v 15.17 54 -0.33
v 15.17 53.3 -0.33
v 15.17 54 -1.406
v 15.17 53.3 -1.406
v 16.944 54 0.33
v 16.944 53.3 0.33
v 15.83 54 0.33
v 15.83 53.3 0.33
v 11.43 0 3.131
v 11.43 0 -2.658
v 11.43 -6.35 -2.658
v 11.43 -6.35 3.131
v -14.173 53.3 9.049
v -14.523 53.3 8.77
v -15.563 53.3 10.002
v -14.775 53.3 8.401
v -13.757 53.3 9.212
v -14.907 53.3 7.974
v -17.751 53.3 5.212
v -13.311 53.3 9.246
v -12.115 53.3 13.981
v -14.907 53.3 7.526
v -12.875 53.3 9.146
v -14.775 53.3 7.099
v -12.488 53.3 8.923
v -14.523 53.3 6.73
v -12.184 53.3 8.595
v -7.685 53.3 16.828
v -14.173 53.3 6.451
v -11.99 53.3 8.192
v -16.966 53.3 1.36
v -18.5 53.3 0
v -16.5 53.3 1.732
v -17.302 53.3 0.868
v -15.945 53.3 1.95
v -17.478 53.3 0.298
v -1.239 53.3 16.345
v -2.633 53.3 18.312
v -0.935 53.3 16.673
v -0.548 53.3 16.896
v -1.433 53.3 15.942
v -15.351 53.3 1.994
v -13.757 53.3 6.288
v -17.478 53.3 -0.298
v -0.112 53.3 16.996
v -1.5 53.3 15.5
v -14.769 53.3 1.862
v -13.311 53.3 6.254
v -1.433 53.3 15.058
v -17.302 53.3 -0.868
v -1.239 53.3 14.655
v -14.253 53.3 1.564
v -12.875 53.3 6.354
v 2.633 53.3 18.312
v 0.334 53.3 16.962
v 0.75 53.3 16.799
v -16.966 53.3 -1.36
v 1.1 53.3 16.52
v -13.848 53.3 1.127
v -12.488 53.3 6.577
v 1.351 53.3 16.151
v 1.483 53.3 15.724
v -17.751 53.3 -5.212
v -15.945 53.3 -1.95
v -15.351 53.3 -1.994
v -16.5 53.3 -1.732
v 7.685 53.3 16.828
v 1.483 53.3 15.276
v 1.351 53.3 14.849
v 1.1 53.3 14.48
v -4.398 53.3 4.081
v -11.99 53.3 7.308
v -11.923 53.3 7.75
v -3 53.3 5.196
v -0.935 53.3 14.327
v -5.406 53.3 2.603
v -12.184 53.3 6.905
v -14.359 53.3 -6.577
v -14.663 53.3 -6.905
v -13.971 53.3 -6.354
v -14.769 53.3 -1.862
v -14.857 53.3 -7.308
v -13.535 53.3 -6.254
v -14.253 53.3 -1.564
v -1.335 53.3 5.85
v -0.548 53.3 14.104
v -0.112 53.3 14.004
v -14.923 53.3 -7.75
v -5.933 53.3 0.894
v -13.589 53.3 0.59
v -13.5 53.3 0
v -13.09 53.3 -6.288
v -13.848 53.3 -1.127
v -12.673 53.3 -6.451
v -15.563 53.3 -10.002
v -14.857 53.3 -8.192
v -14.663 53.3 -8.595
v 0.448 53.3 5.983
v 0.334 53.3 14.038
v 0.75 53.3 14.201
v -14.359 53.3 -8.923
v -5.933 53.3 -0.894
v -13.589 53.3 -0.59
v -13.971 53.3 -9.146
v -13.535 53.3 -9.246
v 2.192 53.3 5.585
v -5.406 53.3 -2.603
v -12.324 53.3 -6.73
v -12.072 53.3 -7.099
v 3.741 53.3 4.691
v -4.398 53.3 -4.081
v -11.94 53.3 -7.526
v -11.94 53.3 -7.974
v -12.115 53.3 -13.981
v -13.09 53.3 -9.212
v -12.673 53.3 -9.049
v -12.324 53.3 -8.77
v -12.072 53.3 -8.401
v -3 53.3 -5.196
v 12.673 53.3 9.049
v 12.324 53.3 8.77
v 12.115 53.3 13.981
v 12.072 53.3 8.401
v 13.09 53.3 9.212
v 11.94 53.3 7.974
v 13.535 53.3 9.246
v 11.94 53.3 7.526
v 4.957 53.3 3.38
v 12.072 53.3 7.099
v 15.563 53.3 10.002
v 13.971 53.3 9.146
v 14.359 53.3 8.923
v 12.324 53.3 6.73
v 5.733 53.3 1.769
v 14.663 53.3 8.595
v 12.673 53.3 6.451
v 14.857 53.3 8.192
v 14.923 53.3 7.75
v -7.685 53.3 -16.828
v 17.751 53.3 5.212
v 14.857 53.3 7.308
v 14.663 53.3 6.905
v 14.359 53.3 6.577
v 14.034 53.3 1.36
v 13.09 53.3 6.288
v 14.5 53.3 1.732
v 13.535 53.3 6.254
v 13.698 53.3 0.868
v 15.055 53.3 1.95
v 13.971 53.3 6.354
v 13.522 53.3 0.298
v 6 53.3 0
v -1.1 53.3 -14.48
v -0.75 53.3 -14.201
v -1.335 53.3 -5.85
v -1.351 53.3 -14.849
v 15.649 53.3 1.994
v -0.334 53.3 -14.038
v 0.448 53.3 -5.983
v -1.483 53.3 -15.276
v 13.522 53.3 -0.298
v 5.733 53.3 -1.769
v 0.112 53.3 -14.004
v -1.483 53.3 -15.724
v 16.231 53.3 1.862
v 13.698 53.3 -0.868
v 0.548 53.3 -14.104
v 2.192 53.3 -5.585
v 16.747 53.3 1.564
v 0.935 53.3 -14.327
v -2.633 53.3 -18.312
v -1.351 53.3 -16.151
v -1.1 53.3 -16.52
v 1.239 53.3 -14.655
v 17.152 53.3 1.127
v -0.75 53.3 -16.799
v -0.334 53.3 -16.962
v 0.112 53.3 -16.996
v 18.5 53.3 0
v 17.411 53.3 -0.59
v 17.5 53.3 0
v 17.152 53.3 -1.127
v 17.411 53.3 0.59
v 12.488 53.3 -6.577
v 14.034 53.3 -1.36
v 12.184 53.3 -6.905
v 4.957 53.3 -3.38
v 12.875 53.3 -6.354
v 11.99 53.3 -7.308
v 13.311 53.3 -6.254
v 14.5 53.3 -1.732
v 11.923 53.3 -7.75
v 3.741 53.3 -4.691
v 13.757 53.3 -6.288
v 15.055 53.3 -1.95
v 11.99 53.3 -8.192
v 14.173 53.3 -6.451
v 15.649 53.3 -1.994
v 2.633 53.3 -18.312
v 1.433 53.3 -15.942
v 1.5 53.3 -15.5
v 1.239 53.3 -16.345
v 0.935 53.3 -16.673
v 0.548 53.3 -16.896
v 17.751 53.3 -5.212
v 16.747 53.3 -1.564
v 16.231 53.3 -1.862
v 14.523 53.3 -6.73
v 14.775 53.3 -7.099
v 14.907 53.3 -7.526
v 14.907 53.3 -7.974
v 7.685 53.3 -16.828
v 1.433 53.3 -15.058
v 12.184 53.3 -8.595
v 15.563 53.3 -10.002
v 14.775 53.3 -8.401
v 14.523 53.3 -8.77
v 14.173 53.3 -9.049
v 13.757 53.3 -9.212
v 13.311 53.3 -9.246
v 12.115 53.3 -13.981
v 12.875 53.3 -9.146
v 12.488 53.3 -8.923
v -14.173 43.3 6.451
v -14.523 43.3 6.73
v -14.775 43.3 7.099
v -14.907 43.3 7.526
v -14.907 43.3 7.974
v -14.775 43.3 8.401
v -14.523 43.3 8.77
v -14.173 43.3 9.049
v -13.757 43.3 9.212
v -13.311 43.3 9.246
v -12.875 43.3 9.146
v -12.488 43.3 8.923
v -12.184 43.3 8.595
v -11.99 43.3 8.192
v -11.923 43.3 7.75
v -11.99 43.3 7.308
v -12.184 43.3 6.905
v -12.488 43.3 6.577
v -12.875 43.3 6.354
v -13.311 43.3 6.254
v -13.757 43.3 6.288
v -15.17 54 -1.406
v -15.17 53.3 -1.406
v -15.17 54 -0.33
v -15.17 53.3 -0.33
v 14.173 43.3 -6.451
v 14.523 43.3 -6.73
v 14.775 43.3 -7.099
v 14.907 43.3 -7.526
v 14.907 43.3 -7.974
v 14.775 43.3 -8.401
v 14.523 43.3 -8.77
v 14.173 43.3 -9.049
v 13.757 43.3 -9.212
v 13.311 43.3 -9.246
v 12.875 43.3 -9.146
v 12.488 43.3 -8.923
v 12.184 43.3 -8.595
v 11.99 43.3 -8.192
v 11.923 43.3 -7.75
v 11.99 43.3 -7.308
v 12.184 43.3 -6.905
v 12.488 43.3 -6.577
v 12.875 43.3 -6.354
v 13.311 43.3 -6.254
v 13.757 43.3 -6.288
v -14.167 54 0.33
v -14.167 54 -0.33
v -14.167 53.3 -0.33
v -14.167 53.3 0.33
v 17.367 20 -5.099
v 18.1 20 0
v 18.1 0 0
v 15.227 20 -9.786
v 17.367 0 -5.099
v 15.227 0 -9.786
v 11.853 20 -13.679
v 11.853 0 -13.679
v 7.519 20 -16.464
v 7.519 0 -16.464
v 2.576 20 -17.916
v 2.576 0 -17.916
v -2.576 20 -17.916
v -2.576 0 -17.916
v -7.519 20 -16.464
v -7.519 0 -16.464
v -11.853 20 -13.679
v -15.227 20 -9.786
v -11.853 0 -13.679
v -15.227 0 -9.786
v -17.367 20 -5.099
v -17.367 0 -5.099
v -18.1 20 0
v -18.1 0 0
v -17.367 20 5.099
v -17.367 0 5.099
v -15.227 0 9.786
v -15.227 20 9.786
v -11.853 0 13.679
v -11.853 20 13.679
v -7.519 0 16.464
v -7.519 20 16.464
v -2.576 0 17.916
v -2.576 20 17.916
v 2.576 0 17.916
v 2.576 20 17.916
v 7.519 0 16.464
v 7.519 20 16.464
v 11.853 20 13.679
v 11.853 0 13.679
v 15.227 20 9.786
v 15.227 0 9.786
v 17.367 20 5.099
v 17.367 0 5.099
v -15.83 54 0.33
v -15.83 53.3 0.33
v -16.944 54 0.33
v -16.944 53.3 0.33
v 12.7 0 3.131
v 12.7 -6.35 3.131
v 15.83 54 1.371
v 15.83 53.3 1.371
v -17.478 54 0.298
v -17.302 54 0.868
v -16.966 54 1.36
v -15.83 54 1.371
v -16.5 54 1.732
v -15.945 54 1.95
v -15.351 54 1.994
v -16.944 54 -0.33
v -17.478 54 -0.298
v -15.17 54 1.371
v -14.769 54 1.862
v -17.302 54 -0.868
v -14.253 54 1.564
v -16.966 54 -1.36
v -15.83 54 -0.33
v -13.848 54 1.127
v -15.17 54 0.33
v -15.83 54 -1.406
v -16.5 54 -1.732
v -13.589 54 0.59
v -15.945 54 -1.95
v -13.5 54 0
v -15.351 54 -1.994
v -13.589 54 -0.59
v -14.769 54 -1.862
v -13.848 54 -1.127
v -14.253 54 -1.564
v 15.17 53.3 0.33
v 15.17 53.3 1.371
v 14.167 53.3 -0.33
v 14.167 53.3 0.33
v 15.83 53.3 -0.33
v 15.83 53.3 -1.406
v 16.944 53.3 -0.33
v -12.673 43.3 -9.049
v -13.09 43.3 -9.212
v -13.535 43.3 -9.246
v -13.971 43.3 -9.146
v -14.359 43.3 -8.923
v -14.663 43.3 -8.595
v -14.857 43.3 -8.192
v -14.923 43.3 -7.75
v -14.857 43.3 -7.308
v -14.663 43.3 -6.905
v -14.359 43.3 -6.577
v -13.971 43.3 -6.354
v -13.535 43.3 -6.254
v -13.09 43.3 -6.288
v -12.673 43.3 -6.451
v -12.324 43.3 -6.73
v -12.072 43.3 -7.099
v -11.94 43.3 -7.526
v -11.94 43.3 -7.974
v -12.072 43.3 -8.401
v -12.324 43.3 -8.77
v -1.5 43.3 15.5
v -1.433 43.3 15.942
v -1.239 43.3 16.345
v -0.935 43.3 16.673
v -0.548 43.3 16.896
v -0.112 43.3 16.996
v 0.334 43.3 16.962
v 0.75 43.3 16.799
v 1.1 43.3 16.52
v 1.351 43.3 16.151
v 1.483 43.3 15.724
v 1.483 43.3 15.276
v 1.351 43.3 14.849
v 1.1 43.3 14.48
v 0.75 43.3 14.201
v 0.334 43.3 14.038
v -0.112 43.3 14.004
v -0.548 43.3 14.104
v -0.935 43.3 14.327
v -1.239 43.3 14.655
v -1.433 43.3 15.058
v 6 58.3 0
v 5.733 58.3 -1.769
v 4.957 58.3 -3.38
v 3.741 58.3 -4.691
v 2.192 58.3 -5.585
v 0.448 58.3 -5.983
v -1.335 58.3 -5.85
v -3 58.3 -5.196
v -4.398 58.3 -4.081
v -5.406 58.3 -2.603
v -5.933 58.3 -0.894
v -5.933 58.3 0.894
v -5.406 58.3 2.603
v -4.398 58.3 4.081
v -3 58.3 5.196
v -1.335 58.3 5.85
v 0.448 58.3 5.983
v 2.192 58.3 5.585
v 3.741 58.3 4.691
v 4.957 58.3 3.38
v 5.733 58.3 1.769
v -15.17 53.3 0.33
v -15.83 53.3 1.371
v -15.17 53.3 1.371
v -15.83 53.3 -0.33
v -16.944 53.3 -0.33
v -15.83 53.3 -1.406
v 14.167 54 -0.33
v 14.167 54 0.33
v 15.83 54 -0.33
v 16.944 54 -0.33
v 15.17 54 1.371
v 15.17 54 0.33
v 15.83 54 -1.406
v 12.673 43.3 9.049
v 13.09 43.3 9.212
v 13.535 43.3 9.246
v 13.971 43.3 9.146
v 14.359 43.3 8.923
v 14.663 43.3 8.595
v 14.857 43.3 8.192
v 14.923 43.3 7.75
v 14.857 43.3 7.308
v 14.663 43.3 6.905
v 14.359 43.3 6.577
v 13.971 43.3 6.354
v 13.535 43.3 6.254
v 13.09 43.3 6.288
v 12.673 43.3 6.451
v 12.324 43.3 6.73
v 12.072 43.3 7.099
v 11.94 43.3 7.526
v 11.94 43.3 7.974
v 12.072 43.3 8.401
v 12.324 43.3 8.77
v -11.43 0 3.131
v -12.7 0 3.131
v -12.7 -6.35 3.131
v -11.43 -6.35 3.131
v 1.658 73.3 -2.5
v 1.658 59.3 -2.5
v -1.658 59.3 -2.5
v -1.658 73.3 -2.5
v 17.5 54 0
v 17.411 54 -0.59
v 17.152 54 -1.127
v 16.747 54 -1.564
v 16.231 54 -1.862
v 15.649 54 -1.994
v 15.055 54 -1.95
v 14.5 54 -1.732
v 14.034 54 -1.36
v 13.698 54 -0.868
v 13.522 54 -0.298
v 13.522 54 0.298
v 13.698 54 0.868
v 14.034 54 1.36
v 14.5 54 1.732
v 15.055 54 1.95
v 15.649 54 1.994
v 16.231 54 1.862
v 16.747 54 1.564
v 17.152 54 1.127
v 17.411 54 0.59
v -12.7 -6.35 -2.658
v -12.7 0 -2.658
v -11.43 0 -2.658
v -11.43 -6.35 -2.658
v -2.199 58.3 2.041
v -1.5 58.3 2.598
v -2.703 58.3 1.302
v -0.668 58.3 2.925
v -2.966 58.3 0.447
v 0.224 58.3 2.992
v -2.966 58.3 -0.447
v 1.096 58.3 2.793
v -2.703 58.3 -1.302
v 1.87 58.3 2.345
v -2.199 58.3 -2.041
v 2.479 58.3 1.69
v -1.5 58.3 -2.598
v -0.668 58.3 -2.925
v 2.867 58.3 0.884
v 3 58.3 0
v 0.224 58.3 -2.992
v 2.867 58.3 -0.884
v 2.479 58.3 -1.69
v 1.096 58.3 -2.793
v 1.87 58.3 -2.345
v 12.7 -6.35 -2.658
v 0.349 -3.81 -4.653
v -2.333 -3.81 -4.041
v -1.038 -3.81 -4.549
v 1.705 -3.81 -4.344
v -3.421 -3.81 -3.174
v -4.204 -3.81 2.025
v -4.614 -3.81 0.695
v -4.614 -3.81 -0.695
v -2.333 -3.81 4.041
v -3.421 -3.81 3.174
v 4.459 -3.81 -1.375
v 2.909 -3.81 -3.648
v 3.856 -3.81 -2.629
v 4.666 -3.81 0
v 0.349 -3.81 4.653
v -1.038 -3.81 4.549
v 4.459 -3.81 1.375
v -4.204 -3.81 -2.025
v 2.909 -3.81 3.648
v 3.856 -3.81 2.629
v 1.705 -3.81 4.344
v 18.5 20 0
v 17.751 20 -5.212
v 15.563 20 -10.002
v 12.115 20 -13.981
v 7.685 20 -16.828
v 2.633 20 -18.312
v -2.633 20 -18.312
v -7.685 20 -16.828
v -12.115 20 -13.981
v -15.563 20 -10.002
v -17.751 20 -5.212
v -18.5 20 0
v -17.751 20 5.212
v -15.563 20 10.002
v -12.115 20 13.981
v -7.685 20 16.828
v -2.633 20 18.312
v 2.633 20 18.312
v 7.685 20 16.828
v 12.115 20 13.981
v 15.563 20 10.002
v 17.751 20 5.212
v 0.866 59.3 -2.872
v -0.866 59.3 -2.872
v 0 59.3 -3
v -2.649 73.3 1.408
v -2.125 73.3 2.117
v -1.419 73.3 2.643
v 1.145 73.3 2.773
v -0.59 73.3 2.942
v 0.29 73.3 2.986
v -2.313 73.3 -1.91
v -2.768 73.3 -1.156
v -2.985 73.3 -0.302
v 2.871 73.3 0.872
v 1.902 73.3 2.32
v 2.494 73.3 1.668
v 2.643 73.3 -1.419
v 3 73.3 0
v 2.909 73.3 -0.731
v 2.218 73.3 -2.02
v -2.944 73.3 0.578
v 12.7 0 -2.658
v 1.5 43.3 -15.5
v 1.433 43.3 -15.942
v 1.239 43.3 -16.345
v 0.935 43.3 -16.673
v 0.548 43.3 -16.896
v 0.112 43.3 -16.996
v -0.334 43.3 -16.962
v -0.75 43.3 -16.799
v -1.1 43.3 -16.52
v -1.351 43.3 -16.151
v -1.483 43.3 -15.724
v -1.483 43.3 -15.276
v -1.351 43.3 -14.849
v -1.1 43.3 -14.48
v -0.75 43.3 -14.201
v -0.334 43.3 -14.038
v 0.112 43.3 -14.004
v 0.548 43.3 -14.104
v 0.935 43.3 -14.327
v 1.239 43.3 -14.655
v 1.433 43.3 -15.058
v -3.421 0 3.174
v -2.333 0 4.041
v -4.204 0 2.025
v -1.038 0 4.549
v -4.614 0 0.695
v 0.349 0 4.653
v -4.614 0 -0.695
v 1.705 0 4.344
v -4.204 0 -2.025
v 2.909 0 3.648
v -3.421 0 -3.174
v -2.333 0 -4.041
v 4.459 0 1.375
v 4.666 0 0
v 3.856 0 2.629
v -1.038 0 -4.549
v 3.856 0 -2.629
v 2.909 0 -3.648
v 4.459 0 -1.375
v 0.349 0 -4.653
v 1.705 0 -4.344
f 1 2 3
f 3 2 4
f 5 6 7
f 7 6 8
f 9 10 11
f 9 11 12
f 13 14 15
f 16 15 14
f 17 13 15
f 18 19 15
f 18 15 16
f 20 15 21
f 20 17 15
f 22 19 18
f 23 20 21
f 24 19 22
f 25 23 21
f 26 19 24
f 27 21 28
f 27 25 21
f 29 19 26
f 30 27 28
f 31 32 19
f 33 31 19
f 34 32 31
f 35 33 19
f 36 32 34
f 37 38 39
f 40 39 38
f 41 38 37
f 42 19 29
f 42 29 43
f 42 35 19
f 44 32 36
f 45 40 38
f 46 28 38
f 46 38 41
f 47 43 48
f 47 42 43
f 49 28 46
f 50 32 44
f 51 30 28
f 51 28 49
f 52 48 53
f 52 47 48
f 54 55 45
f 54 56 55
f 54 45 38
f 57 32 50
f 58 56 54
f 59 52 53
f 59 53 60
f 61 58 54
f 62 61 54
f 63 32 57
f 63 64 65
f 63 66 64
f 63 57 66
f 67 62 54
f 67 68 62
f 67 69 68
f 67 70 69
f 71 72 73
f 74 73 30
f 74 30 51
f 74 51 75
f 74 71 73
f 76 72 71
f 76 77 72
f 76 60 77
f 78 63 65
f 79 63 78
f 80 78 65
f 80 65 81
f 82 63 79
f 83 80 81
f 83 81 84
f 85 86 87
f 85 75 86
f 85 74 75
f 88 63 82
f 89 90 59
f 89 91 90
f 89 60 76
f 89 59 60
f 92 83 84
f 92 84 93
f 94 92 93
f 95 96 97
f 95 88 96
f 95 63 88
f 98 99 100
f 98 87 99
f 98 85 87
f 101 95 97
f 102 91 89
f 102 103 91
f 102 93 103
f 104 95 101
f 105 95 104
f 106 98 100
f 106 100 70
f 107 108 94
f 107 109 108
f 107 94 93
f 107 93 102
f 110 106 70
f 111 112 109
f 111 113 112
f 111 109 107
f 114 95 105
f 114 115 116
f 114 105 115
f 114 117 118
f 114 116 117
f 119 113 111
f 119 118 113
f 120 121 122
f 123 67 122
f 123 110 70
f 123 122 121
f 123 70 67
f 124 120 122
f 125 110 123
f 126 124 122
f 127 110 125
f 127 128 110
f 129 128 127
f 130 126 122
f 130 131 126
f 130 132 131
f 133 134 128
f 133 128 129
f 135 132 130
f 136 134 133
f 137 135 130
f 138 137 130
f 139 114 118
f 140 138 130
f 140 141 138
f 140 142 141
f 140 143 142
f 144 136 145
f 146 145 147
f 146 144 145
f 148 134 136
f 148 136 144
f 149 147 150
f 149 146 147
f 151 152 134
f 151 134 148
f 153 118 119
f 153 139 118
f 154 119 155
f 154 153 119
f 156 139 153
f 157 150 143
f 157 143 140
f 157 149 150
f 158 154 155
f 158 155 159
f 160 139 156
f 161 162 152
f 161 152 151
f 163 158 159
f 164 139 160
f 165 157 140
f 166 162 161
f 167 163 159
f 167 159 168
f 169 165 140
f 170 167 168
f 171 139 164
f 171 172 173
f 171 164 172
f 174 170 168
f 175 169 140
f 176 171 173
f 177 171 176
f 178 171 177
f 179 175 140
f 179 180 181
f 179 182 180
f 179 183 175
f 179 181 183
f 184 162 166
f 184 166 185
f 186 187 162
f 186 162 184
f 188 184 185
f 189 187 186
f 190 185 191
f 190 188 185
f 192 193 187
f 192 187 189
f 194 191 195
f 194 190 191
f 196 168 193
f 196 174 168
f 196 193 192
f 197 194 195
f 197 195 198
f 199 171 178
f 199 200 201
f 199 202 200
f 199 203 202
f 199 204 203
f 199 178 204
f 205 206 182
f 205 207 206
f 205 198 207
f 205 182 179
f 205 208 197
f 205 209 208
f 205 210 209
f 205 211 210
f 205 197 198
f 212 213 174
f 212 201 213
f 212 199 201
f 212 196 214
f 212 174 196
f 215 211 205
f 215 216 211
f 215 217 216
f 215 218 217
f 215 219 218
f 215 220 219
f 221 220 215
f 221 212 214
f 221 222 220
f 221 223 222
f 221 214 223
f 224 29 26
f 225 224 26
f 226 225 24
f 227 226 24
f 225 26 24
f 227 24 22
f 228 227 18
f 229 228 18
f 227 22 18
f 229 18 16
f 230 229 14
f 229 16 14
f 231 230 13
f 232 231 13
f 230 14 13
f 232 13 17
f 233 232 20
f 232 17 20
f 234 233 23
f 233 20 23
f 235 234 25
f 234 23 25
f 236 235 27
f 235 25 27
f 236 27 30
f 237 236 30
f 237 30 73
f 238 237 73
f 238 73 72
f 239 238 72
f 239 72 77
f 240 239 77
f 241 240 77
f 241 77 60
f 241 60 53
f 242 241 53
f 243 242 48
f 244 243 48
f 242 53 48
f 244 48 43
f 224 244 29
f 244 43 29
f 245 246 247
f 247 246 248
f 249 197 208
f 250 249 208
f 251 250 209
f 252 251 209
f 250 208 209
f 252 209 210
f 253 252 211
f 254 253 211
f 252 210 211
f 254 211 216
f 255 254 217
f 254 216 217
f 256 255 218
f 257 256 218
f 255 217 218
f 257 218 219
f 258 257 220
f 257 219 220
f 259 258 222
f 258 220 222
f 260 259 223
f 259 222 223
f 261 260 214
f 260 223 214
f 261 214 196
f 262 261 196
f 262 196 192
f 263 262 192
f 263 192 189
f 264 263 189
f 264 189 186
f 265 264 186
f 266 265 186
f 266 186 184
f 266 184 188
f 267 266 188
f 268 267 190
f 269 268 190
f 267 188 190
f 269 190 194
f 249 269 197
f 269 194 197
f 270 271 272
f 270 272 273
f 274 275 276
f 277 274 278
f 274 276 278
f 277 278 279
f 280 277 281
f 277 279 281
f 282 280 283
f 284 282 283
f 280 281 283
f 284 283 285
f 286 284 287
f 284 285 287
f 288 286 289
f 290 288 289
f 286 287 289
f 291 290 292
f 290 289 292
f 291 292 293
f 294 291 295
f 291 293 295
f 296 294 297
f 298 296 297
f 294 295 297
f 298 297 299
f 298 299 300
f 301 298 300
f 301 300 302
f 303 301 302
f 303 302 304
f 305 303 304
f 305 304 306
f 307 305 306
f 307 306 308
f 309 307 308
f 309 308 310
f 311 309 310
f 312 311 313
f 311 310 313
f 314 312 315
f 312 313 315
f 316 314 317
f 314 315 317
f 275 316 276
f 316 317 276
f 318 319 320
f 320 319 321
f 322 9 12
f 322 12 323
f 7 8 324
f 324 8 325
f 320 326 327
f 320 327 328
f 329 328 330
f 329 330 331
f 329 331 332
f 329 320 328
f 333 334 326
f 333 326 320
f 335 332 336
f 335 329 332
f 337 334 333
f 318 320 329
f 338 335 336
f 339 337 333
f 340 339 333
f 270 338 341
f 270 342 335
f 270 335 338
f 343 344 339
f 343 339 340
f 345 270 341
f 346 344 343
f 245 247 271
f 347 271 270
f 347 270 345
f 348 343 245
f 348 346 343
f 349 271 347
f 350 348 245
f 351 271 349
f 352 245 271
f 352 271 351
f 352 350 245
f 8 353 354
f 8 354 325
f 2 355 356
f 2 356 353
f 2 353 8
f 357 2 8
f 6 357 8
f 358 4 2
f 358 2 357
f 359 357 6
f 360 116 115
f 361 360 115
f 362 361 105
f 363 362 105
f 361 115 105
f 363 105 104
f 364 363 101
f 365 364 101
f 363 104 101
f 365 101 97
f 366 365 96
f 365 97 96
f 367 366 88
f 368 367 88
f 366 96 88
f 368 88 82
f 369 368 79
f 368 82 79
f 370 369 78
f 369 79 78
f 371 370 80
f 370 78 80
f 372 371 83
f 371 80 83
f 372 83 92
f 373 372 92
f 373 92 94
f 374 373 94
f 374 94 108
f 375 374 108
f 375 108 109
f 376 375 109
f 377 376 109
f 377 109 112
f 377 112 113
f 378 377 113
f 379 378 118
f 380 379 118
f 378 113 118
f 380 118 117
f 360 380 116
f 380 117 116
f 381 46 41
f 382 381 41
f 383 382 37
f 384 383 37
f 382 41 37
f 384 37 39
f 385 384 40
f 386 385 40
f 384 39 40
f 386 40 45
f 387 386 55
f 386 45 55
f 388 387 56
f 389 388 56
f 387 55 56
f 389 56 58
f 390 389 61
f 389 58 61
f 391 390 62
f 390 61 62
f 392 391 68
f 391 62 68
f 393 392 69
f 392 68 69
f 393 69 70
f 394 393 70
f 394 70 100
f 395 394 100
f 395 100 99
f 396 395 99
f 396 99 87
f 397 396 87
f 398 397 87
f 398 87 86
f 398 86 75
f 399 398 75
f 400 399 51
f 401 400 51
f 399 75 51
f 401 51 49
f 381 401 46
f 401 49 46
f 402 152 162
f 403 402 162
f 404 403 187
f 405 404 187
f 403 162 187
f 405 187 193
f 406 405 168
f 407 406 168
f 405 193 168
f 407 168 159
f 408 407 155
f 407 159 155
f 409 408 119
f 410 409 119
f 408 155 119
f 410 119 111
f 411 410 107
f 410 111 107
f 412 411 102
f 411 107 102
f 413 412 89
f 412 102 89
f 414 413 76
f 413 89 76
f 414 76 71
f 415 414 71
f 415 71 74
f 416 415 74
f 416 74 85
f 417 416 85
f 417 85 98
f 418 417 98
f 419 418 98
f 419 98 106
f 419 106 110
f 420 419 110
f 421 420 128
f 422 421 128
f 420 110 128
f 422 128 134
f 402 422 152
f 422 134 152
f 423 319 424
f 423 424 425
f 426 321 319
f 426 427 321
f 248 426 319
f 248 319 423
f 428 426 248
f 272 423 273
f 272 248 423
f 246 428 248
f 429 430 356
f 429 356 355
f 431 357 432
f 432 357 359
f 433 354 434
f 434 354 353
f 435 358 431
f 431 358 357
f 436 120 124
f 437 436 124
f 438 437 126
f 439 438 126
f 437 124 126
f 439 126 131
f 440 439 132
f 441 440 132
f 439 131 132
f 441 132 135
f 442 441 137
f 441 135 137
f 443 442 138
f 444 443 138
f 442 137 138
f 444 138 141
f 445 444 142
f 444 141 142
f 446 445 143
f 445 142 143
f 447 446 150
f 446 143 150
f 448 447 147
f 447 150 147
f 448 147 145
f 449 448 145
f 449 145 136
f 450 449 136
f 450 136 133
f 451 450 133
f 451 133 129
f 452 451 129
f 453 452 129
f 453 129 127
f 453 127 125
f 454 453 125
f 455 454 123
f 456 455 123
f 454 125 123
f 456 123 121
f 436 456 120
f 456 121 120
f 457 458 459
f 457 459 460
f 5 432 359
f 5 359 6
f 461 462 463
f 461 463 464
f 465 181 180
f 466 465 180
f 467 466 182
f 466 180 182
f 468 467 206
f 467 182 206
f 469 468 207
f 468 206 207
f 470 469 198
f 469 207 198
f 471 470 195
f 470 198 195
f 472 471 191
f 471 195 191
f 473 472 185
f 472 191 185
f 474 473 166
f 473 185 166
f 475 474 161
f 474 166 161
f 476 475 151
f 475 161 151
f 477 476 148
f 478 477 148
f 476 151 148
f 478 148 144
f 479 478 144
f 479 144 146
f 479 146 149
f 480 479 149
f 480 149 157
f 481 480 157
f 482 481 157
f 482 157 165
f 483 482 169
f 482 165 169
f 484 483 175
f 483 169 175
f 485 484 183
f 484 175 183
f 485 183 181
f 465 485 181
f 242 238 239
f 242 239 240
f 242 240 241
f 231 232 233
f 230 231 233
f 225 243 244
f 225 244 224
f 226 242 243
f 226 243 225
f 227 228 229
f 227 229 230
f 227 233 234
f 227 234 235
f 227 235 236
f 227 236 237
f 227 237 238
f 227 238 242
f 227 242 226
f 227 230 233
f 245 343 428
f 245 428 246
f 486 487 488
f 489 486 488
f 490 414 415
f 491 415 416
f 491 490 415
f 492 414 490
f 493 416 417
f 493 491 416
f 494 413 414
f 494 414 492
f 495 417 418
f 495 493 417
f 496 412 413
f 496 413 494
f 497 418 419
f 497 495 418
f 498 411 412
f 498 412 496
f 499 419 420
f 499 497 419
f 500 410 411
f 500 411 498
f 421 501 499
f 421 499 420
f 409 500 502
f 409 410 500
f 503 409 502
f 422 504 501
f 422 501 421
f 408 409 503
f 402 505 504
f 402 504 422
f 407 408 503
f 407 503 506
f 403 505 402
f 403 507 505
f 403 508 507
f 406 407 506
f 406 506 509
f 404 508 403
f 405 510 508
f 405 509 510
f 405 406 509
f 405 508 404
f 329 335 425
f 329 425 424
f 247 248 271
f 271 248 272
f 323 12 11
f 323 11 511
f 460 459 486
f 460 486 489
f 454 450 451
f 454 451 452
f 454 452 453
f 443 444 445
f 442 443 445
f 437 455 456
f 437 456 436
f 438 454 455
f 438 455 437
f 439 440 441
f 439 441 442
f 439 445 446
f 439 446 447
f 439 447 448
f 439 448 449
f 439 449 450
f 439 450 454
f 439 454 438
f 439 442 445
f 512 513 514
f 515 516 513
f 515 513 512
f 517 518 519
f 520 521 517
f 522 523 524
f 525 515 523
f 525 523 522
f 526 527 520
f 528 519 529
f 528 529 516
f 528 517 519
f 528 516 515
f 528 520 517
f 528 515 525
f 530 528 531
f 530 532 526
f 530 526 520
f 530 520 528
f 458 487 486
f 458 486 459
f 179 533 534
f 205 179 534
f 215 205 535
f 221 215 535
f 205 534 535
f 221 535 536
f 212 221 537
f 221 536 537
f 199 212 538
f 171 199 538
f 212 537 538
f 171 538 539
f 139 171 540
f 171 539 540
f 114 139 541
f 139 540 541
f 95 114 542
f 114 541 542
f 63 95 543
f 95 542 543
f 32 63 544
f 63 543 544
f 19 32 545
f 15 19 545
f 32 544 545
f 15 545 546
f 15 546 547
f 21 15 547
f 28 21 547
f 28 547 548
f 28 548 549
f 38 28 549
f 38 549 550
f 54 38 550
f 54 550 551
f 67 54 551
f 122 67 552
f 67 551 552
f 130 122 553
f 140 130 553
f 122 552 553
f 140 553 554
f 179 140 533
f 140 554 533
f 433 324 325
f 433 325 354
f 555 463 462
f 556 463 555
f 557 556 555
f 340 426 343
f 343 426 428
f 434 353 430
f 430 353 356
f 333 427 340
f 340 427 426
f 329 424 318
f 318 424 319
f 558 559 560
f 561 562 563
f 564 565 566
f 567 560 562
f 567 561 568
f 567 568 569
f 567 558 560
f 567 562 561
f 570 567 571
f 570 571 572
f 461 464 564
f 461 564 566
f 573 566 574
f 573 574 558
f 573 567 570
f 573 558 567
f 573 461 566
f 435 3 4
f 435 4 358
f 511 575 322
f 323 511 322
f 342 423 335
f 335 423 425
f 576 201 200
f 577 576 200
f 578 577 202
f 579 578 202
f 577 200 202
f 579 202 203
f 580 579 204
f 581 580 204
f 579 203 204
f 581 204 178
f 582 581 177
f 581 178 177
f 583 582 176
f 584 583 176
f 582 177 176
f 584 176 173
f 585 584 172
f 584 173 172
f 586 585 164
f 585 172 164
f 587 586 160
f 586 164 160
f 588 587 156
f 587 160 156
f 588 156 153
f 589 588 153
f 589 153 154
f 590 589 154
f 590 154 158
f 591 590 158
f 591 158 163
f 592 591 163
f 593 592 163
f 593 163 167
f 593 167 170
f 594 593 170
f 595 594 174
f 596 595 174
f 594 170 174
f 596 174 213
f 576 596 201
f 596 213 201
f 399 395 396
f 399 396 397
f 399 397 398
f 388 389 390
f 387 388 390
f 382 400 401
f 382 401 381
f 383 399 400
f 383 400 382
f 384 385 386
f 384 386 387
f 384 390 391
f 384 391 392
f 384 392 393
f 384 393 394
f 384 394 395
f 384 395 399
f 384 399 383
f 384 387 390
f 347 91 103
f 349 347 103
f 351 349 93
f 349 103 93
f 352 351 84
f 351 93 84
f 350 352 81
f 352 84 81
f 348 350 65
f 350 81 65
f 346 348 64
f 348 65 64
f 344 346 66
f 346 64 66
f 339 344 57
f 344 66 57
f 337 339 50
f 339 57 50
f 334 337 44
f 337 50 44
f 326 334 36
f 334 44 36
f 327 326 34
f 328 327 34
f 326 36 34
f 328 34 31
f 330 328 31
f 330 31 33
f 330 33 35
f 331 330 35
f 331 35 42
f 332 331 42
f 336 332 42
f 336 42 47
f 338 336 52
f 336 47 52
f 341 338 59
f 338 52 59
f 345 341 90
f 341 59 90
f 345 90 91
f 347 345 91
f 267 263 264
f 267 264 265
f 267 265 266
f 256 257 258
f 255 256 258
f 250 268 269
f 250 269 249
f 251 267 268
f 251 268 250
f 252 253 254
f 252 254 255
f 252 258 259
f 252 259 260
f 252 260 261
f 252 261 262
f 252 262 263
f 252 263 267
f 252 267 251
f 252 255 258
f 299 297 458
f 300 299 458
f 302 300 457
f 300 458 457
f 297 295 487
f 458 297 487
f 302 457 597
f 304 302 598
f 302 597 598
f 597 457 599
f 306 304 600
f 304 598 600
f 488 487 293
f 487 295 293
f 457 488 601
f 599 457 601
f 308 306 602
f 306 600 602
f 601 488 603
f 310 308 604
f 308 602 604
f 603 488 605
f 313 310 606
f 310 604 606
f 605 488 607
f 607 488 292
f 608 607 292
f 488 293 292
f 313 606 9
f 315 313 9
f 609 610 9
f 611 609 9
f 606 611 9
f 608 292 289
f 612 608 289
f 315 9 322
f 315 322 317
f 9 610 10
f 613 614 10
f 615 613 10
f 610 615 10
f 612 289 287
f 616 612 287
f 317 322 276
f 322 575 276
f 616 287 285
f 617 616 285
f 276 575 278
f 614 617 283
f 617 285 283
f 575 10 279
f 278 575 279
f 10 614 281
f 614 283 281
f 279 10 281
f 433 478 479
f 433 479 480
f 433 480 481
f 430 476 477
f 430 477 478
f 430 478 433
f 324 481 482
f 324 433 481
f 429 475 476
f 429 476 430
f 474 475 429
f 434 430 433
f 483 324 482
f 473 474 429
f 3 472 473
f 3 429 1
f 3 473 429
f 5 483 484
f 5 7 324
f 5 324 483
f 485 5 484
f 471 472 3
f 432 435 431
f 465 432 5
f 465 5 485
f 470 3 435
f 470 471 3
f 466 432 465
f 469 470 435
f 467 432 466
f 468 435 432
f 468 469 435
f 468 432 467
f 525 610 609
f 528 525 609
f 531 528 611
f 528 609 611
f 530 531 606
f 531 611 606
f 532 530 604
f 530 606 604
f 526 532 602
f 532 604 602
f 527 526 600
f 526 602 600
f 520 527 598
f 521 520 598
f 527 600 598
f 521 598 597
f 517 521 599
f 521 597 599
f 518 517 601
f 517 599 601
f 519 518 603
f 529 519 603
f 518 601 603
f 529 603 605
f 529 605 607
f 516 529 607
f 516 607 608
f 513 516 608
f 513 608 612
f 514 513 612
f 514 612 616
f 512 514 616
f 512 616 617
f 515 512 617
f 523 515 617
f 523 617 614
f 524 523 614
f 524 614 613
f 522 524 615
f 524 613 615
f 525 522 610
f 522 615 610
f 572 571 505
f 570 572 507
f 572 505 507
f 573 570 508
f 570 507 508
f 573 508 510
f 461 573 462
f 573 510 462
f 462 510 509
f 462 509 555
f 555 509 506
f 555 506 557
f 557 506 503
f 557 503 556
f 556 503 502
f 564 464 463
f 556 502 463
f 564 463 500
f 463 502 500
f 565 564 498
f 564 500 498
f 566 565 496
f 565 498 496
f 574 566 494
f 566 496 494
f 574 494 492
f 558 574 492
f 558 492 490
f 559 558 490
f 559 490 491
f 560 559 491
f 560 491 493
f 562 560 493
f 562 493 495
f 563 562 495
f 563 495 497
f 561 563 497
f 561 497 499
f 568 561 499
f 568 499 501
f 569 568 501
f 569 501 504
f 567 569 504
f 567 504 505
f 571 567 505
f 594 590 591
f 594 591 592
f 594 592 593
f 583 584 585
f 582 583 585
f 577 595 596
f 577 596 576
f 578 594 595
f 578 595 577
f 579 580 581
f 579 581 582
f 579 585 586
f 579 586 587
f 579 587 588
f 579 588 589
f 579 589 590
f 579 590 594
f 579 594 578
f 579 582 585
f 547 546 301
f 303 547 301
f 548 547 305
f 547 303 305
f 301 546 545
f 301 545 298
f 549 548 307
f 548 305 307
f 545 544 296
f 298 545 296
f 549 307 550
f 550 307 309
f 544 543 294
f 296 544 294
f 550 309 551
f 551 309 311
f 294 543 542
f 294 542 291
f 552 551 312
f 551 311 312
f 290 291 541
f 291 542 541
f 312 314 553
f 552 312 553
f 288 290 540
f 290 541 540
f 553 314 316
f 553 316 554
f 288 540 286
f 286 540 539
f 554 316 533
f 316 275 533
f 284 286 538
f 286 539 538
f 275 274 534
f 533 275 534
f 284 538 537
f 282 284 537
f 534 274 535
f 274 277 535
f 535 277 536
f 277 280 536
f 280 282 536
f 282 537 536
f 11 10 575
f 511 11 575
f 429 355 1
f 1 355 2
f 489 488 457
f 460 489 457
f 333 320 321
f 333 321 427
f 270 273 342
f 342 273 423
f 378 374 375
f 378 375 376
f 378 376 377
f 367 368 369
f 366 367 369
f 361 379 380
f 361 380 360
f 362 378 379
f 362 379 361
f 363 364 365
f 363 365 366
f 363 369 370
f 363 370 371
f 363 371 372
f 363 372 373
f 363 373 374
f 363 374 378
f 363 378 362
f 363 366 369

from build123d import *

# Parameters (mm, degrees)
SKETCH1_R                 = 18.1
BASE_EXTRUDE_DEPTH        = 20
SKETCH2_R                 = 18.5
MOTOR_TOP_DEPTH           = 33.3
SKETCH3_R                 = 4.666403254
REAR_NUB_DEPTH            = 3.81
SKETCH4_W                 = 1.27
SKETCH4_H                 = 5.788702771
TEETH_PLUGS_DEPTH         = 6.35
SKETCH5_R                 = 6
AXLE_BASE_DEPTH           = 5
SKETCH7_R                 = 3
AXLE_DEPTH                = 15
SKETCH8_W                 = 0.5
SKETCH8_H                 = 14
D_SHAFT_CUTOUT_DEPTH      = 19.5
D_SHAFT_CUTOUT_DEPTH_BACK = 19.5
SKETCH9_R                 = 1.5
M3_SCREW_HOLES_DEPTH      = 10
SCREW_HOLE_PATTERN_COUNT  = 6
SKETCH10_R                = 2
PHILIPS_SCREWS_DEPTH      = 0.7


with BuildPart() as part:
    # Sketch1 → Base Extrude (new body)
    with BuildSketch(Plane(origin=(0, 0, 0), x_dir=(1, 0, 0), z_dir=(0, 1, 0))):
        Circle(SKETCH1_R)
    extrude(amount=BASE_EXTRUDE_DEPTH)

    # Sketch2 → Motor Top (add)
    with BuildSketch(Plane(origin=(0, 20, 0), x_dir=(1, 0, 0), z_dir=(0, 1, 0))):
        Circle(SKETCH2_R)
    extrude(amount=MOTOR_TOP_DEPTH)

    # Sketch3 → Rear nub (add)
    with BuildSketch(Plane.XZ):
        Circle(SKETCH3_R)
    extrude(amount=REAR_NUB_DEPTH)

    # Sketch4 → Teeth plugs (add)
    with BuildSketch(Plane.XZ):
        with Locations((-12.065, 0.236273582)):
            Rectangle(SKETCH4_W, SKETCH4_H)
        with Locations((12.065, 0.236273582)):
            Rectangle(SKETCH4_W, SKETCH4_H)
    extrude(amount=TEETH_PLUGS_DEPTH)

    # Sketch5 → Axle base (add)
    with BuildSketch(Plane(origin=(0, 53.3, 0), x_dir=(1, 0, 0), z_dir=(0, 1, 0))):
        Circle(SKETCH5_R)
    extrude(amount=AXLE_BASE_DEPTH)

    # Sketch7 → Axle (add)
    with BuildSketch(Plane(origin=(0, 58.3, 0), x_dir=(1, 0, 0), z_dir=(0, 1, 0))):
        Circle(SKETCH7_R)
    extrude(amount=AXLE_DEPTH)

    # Sketch8 → D shaft cutout (cut, two sides)
    with BuildSketch(Plane(origin=(0, 0, 0), x_dir=(0, 0, -1), z_dir=(1, 0, 0))) as d_shaft_cutout_sk:
        with Locations((2.75, 66.3)):
            Rectangle(SKETCH8_W, SKETCH8_H)
    extrude(amount=D_SHAFT_CUTOUT_DEPTH, mode=Mode.SUBTRACT)
    extrude(d_shaft_cutout_sk.sketch, amount=-D_SHAFT_CUTOUT_DEPTH_BACK, mode=Mode.SUBTRACT)

    # Sketch9 → M3 Screw Holes (cut)
    with BuildSketch(Plane(origin=(0, 53.3, 0), x_dir=(1, 0, 0), z_dir=(0, 1, 0))):
        with Locations((0, 15.5)):
            Circle(SKETCH9_R)
    m3_screw_holes = extrude(amount=-M3_SCREW_HOLES_DEPTH, mode=Mode.SUBTRACT)

    # Screw Hole Pattern: M3 Screw Holes ×6 about axis
    screw_hole_pattern_axis = Axis((0, 0, 0), (0, 1, 0))
    for i in range(1, SCREW_HOLE_PATTERN_COUNT):
        add(m3_screw_holes.rotate(screw_hole_pattern_axis, i * 360 / SCREW_HOLE_PATTERN_COUNT), mode=Mode.SUBTRACT)

    # Sketch10 → Philips Screws (add)
    with BuildSketch(Plane(origin=(0, 53.3, 0), x_dir=(1, 0, 0), z_dir=(0, 1, 0))):
        with Locations((-15.5, 0)):
            Circle(SKETCH10_R)
        Polygon((-16.943750133, -0.329942757), (-16.943750133, 0.329942757), (-15.829942757, 0.329942757), (-15.829942757, 1.40634253), (-15.170057243, 1.40634253), (-15.170057243, 0.329942757), (-14.166731925, 0.329942757), (-14.166731925, -0.329942757), (-15.170057243, -0.329942757), (-15.170057243, -1.370675678), (-15.829942757, -1.370675678), (-15.829942757, -0.329942757), align=None, mode=Mode.SUBTRACT)
        with Locations((15.5, 0)):
            Circle(SKETCH10_R)
        Polygon((15.829942757, 0.329942757), (16.943750133, 0.329942757), (16.943750133, -0.329942757), (15.829942757, -0.329942757), (15.829942757, -1.370675678), (15.170057243, -1.370675678), (15.170057243, -0.329942757), (14.166731925, -0.329942757), (14.166731925, 0.329942757), (15.170057243, 0.329942757), (15.170057243, 1.40634253), (15.829942757, 1.40634253), align=None, mode=Mode.SUBTRACT)
    extrude(amount=PHILIPS_SCREWS_DEPTH)


solid = part.part
